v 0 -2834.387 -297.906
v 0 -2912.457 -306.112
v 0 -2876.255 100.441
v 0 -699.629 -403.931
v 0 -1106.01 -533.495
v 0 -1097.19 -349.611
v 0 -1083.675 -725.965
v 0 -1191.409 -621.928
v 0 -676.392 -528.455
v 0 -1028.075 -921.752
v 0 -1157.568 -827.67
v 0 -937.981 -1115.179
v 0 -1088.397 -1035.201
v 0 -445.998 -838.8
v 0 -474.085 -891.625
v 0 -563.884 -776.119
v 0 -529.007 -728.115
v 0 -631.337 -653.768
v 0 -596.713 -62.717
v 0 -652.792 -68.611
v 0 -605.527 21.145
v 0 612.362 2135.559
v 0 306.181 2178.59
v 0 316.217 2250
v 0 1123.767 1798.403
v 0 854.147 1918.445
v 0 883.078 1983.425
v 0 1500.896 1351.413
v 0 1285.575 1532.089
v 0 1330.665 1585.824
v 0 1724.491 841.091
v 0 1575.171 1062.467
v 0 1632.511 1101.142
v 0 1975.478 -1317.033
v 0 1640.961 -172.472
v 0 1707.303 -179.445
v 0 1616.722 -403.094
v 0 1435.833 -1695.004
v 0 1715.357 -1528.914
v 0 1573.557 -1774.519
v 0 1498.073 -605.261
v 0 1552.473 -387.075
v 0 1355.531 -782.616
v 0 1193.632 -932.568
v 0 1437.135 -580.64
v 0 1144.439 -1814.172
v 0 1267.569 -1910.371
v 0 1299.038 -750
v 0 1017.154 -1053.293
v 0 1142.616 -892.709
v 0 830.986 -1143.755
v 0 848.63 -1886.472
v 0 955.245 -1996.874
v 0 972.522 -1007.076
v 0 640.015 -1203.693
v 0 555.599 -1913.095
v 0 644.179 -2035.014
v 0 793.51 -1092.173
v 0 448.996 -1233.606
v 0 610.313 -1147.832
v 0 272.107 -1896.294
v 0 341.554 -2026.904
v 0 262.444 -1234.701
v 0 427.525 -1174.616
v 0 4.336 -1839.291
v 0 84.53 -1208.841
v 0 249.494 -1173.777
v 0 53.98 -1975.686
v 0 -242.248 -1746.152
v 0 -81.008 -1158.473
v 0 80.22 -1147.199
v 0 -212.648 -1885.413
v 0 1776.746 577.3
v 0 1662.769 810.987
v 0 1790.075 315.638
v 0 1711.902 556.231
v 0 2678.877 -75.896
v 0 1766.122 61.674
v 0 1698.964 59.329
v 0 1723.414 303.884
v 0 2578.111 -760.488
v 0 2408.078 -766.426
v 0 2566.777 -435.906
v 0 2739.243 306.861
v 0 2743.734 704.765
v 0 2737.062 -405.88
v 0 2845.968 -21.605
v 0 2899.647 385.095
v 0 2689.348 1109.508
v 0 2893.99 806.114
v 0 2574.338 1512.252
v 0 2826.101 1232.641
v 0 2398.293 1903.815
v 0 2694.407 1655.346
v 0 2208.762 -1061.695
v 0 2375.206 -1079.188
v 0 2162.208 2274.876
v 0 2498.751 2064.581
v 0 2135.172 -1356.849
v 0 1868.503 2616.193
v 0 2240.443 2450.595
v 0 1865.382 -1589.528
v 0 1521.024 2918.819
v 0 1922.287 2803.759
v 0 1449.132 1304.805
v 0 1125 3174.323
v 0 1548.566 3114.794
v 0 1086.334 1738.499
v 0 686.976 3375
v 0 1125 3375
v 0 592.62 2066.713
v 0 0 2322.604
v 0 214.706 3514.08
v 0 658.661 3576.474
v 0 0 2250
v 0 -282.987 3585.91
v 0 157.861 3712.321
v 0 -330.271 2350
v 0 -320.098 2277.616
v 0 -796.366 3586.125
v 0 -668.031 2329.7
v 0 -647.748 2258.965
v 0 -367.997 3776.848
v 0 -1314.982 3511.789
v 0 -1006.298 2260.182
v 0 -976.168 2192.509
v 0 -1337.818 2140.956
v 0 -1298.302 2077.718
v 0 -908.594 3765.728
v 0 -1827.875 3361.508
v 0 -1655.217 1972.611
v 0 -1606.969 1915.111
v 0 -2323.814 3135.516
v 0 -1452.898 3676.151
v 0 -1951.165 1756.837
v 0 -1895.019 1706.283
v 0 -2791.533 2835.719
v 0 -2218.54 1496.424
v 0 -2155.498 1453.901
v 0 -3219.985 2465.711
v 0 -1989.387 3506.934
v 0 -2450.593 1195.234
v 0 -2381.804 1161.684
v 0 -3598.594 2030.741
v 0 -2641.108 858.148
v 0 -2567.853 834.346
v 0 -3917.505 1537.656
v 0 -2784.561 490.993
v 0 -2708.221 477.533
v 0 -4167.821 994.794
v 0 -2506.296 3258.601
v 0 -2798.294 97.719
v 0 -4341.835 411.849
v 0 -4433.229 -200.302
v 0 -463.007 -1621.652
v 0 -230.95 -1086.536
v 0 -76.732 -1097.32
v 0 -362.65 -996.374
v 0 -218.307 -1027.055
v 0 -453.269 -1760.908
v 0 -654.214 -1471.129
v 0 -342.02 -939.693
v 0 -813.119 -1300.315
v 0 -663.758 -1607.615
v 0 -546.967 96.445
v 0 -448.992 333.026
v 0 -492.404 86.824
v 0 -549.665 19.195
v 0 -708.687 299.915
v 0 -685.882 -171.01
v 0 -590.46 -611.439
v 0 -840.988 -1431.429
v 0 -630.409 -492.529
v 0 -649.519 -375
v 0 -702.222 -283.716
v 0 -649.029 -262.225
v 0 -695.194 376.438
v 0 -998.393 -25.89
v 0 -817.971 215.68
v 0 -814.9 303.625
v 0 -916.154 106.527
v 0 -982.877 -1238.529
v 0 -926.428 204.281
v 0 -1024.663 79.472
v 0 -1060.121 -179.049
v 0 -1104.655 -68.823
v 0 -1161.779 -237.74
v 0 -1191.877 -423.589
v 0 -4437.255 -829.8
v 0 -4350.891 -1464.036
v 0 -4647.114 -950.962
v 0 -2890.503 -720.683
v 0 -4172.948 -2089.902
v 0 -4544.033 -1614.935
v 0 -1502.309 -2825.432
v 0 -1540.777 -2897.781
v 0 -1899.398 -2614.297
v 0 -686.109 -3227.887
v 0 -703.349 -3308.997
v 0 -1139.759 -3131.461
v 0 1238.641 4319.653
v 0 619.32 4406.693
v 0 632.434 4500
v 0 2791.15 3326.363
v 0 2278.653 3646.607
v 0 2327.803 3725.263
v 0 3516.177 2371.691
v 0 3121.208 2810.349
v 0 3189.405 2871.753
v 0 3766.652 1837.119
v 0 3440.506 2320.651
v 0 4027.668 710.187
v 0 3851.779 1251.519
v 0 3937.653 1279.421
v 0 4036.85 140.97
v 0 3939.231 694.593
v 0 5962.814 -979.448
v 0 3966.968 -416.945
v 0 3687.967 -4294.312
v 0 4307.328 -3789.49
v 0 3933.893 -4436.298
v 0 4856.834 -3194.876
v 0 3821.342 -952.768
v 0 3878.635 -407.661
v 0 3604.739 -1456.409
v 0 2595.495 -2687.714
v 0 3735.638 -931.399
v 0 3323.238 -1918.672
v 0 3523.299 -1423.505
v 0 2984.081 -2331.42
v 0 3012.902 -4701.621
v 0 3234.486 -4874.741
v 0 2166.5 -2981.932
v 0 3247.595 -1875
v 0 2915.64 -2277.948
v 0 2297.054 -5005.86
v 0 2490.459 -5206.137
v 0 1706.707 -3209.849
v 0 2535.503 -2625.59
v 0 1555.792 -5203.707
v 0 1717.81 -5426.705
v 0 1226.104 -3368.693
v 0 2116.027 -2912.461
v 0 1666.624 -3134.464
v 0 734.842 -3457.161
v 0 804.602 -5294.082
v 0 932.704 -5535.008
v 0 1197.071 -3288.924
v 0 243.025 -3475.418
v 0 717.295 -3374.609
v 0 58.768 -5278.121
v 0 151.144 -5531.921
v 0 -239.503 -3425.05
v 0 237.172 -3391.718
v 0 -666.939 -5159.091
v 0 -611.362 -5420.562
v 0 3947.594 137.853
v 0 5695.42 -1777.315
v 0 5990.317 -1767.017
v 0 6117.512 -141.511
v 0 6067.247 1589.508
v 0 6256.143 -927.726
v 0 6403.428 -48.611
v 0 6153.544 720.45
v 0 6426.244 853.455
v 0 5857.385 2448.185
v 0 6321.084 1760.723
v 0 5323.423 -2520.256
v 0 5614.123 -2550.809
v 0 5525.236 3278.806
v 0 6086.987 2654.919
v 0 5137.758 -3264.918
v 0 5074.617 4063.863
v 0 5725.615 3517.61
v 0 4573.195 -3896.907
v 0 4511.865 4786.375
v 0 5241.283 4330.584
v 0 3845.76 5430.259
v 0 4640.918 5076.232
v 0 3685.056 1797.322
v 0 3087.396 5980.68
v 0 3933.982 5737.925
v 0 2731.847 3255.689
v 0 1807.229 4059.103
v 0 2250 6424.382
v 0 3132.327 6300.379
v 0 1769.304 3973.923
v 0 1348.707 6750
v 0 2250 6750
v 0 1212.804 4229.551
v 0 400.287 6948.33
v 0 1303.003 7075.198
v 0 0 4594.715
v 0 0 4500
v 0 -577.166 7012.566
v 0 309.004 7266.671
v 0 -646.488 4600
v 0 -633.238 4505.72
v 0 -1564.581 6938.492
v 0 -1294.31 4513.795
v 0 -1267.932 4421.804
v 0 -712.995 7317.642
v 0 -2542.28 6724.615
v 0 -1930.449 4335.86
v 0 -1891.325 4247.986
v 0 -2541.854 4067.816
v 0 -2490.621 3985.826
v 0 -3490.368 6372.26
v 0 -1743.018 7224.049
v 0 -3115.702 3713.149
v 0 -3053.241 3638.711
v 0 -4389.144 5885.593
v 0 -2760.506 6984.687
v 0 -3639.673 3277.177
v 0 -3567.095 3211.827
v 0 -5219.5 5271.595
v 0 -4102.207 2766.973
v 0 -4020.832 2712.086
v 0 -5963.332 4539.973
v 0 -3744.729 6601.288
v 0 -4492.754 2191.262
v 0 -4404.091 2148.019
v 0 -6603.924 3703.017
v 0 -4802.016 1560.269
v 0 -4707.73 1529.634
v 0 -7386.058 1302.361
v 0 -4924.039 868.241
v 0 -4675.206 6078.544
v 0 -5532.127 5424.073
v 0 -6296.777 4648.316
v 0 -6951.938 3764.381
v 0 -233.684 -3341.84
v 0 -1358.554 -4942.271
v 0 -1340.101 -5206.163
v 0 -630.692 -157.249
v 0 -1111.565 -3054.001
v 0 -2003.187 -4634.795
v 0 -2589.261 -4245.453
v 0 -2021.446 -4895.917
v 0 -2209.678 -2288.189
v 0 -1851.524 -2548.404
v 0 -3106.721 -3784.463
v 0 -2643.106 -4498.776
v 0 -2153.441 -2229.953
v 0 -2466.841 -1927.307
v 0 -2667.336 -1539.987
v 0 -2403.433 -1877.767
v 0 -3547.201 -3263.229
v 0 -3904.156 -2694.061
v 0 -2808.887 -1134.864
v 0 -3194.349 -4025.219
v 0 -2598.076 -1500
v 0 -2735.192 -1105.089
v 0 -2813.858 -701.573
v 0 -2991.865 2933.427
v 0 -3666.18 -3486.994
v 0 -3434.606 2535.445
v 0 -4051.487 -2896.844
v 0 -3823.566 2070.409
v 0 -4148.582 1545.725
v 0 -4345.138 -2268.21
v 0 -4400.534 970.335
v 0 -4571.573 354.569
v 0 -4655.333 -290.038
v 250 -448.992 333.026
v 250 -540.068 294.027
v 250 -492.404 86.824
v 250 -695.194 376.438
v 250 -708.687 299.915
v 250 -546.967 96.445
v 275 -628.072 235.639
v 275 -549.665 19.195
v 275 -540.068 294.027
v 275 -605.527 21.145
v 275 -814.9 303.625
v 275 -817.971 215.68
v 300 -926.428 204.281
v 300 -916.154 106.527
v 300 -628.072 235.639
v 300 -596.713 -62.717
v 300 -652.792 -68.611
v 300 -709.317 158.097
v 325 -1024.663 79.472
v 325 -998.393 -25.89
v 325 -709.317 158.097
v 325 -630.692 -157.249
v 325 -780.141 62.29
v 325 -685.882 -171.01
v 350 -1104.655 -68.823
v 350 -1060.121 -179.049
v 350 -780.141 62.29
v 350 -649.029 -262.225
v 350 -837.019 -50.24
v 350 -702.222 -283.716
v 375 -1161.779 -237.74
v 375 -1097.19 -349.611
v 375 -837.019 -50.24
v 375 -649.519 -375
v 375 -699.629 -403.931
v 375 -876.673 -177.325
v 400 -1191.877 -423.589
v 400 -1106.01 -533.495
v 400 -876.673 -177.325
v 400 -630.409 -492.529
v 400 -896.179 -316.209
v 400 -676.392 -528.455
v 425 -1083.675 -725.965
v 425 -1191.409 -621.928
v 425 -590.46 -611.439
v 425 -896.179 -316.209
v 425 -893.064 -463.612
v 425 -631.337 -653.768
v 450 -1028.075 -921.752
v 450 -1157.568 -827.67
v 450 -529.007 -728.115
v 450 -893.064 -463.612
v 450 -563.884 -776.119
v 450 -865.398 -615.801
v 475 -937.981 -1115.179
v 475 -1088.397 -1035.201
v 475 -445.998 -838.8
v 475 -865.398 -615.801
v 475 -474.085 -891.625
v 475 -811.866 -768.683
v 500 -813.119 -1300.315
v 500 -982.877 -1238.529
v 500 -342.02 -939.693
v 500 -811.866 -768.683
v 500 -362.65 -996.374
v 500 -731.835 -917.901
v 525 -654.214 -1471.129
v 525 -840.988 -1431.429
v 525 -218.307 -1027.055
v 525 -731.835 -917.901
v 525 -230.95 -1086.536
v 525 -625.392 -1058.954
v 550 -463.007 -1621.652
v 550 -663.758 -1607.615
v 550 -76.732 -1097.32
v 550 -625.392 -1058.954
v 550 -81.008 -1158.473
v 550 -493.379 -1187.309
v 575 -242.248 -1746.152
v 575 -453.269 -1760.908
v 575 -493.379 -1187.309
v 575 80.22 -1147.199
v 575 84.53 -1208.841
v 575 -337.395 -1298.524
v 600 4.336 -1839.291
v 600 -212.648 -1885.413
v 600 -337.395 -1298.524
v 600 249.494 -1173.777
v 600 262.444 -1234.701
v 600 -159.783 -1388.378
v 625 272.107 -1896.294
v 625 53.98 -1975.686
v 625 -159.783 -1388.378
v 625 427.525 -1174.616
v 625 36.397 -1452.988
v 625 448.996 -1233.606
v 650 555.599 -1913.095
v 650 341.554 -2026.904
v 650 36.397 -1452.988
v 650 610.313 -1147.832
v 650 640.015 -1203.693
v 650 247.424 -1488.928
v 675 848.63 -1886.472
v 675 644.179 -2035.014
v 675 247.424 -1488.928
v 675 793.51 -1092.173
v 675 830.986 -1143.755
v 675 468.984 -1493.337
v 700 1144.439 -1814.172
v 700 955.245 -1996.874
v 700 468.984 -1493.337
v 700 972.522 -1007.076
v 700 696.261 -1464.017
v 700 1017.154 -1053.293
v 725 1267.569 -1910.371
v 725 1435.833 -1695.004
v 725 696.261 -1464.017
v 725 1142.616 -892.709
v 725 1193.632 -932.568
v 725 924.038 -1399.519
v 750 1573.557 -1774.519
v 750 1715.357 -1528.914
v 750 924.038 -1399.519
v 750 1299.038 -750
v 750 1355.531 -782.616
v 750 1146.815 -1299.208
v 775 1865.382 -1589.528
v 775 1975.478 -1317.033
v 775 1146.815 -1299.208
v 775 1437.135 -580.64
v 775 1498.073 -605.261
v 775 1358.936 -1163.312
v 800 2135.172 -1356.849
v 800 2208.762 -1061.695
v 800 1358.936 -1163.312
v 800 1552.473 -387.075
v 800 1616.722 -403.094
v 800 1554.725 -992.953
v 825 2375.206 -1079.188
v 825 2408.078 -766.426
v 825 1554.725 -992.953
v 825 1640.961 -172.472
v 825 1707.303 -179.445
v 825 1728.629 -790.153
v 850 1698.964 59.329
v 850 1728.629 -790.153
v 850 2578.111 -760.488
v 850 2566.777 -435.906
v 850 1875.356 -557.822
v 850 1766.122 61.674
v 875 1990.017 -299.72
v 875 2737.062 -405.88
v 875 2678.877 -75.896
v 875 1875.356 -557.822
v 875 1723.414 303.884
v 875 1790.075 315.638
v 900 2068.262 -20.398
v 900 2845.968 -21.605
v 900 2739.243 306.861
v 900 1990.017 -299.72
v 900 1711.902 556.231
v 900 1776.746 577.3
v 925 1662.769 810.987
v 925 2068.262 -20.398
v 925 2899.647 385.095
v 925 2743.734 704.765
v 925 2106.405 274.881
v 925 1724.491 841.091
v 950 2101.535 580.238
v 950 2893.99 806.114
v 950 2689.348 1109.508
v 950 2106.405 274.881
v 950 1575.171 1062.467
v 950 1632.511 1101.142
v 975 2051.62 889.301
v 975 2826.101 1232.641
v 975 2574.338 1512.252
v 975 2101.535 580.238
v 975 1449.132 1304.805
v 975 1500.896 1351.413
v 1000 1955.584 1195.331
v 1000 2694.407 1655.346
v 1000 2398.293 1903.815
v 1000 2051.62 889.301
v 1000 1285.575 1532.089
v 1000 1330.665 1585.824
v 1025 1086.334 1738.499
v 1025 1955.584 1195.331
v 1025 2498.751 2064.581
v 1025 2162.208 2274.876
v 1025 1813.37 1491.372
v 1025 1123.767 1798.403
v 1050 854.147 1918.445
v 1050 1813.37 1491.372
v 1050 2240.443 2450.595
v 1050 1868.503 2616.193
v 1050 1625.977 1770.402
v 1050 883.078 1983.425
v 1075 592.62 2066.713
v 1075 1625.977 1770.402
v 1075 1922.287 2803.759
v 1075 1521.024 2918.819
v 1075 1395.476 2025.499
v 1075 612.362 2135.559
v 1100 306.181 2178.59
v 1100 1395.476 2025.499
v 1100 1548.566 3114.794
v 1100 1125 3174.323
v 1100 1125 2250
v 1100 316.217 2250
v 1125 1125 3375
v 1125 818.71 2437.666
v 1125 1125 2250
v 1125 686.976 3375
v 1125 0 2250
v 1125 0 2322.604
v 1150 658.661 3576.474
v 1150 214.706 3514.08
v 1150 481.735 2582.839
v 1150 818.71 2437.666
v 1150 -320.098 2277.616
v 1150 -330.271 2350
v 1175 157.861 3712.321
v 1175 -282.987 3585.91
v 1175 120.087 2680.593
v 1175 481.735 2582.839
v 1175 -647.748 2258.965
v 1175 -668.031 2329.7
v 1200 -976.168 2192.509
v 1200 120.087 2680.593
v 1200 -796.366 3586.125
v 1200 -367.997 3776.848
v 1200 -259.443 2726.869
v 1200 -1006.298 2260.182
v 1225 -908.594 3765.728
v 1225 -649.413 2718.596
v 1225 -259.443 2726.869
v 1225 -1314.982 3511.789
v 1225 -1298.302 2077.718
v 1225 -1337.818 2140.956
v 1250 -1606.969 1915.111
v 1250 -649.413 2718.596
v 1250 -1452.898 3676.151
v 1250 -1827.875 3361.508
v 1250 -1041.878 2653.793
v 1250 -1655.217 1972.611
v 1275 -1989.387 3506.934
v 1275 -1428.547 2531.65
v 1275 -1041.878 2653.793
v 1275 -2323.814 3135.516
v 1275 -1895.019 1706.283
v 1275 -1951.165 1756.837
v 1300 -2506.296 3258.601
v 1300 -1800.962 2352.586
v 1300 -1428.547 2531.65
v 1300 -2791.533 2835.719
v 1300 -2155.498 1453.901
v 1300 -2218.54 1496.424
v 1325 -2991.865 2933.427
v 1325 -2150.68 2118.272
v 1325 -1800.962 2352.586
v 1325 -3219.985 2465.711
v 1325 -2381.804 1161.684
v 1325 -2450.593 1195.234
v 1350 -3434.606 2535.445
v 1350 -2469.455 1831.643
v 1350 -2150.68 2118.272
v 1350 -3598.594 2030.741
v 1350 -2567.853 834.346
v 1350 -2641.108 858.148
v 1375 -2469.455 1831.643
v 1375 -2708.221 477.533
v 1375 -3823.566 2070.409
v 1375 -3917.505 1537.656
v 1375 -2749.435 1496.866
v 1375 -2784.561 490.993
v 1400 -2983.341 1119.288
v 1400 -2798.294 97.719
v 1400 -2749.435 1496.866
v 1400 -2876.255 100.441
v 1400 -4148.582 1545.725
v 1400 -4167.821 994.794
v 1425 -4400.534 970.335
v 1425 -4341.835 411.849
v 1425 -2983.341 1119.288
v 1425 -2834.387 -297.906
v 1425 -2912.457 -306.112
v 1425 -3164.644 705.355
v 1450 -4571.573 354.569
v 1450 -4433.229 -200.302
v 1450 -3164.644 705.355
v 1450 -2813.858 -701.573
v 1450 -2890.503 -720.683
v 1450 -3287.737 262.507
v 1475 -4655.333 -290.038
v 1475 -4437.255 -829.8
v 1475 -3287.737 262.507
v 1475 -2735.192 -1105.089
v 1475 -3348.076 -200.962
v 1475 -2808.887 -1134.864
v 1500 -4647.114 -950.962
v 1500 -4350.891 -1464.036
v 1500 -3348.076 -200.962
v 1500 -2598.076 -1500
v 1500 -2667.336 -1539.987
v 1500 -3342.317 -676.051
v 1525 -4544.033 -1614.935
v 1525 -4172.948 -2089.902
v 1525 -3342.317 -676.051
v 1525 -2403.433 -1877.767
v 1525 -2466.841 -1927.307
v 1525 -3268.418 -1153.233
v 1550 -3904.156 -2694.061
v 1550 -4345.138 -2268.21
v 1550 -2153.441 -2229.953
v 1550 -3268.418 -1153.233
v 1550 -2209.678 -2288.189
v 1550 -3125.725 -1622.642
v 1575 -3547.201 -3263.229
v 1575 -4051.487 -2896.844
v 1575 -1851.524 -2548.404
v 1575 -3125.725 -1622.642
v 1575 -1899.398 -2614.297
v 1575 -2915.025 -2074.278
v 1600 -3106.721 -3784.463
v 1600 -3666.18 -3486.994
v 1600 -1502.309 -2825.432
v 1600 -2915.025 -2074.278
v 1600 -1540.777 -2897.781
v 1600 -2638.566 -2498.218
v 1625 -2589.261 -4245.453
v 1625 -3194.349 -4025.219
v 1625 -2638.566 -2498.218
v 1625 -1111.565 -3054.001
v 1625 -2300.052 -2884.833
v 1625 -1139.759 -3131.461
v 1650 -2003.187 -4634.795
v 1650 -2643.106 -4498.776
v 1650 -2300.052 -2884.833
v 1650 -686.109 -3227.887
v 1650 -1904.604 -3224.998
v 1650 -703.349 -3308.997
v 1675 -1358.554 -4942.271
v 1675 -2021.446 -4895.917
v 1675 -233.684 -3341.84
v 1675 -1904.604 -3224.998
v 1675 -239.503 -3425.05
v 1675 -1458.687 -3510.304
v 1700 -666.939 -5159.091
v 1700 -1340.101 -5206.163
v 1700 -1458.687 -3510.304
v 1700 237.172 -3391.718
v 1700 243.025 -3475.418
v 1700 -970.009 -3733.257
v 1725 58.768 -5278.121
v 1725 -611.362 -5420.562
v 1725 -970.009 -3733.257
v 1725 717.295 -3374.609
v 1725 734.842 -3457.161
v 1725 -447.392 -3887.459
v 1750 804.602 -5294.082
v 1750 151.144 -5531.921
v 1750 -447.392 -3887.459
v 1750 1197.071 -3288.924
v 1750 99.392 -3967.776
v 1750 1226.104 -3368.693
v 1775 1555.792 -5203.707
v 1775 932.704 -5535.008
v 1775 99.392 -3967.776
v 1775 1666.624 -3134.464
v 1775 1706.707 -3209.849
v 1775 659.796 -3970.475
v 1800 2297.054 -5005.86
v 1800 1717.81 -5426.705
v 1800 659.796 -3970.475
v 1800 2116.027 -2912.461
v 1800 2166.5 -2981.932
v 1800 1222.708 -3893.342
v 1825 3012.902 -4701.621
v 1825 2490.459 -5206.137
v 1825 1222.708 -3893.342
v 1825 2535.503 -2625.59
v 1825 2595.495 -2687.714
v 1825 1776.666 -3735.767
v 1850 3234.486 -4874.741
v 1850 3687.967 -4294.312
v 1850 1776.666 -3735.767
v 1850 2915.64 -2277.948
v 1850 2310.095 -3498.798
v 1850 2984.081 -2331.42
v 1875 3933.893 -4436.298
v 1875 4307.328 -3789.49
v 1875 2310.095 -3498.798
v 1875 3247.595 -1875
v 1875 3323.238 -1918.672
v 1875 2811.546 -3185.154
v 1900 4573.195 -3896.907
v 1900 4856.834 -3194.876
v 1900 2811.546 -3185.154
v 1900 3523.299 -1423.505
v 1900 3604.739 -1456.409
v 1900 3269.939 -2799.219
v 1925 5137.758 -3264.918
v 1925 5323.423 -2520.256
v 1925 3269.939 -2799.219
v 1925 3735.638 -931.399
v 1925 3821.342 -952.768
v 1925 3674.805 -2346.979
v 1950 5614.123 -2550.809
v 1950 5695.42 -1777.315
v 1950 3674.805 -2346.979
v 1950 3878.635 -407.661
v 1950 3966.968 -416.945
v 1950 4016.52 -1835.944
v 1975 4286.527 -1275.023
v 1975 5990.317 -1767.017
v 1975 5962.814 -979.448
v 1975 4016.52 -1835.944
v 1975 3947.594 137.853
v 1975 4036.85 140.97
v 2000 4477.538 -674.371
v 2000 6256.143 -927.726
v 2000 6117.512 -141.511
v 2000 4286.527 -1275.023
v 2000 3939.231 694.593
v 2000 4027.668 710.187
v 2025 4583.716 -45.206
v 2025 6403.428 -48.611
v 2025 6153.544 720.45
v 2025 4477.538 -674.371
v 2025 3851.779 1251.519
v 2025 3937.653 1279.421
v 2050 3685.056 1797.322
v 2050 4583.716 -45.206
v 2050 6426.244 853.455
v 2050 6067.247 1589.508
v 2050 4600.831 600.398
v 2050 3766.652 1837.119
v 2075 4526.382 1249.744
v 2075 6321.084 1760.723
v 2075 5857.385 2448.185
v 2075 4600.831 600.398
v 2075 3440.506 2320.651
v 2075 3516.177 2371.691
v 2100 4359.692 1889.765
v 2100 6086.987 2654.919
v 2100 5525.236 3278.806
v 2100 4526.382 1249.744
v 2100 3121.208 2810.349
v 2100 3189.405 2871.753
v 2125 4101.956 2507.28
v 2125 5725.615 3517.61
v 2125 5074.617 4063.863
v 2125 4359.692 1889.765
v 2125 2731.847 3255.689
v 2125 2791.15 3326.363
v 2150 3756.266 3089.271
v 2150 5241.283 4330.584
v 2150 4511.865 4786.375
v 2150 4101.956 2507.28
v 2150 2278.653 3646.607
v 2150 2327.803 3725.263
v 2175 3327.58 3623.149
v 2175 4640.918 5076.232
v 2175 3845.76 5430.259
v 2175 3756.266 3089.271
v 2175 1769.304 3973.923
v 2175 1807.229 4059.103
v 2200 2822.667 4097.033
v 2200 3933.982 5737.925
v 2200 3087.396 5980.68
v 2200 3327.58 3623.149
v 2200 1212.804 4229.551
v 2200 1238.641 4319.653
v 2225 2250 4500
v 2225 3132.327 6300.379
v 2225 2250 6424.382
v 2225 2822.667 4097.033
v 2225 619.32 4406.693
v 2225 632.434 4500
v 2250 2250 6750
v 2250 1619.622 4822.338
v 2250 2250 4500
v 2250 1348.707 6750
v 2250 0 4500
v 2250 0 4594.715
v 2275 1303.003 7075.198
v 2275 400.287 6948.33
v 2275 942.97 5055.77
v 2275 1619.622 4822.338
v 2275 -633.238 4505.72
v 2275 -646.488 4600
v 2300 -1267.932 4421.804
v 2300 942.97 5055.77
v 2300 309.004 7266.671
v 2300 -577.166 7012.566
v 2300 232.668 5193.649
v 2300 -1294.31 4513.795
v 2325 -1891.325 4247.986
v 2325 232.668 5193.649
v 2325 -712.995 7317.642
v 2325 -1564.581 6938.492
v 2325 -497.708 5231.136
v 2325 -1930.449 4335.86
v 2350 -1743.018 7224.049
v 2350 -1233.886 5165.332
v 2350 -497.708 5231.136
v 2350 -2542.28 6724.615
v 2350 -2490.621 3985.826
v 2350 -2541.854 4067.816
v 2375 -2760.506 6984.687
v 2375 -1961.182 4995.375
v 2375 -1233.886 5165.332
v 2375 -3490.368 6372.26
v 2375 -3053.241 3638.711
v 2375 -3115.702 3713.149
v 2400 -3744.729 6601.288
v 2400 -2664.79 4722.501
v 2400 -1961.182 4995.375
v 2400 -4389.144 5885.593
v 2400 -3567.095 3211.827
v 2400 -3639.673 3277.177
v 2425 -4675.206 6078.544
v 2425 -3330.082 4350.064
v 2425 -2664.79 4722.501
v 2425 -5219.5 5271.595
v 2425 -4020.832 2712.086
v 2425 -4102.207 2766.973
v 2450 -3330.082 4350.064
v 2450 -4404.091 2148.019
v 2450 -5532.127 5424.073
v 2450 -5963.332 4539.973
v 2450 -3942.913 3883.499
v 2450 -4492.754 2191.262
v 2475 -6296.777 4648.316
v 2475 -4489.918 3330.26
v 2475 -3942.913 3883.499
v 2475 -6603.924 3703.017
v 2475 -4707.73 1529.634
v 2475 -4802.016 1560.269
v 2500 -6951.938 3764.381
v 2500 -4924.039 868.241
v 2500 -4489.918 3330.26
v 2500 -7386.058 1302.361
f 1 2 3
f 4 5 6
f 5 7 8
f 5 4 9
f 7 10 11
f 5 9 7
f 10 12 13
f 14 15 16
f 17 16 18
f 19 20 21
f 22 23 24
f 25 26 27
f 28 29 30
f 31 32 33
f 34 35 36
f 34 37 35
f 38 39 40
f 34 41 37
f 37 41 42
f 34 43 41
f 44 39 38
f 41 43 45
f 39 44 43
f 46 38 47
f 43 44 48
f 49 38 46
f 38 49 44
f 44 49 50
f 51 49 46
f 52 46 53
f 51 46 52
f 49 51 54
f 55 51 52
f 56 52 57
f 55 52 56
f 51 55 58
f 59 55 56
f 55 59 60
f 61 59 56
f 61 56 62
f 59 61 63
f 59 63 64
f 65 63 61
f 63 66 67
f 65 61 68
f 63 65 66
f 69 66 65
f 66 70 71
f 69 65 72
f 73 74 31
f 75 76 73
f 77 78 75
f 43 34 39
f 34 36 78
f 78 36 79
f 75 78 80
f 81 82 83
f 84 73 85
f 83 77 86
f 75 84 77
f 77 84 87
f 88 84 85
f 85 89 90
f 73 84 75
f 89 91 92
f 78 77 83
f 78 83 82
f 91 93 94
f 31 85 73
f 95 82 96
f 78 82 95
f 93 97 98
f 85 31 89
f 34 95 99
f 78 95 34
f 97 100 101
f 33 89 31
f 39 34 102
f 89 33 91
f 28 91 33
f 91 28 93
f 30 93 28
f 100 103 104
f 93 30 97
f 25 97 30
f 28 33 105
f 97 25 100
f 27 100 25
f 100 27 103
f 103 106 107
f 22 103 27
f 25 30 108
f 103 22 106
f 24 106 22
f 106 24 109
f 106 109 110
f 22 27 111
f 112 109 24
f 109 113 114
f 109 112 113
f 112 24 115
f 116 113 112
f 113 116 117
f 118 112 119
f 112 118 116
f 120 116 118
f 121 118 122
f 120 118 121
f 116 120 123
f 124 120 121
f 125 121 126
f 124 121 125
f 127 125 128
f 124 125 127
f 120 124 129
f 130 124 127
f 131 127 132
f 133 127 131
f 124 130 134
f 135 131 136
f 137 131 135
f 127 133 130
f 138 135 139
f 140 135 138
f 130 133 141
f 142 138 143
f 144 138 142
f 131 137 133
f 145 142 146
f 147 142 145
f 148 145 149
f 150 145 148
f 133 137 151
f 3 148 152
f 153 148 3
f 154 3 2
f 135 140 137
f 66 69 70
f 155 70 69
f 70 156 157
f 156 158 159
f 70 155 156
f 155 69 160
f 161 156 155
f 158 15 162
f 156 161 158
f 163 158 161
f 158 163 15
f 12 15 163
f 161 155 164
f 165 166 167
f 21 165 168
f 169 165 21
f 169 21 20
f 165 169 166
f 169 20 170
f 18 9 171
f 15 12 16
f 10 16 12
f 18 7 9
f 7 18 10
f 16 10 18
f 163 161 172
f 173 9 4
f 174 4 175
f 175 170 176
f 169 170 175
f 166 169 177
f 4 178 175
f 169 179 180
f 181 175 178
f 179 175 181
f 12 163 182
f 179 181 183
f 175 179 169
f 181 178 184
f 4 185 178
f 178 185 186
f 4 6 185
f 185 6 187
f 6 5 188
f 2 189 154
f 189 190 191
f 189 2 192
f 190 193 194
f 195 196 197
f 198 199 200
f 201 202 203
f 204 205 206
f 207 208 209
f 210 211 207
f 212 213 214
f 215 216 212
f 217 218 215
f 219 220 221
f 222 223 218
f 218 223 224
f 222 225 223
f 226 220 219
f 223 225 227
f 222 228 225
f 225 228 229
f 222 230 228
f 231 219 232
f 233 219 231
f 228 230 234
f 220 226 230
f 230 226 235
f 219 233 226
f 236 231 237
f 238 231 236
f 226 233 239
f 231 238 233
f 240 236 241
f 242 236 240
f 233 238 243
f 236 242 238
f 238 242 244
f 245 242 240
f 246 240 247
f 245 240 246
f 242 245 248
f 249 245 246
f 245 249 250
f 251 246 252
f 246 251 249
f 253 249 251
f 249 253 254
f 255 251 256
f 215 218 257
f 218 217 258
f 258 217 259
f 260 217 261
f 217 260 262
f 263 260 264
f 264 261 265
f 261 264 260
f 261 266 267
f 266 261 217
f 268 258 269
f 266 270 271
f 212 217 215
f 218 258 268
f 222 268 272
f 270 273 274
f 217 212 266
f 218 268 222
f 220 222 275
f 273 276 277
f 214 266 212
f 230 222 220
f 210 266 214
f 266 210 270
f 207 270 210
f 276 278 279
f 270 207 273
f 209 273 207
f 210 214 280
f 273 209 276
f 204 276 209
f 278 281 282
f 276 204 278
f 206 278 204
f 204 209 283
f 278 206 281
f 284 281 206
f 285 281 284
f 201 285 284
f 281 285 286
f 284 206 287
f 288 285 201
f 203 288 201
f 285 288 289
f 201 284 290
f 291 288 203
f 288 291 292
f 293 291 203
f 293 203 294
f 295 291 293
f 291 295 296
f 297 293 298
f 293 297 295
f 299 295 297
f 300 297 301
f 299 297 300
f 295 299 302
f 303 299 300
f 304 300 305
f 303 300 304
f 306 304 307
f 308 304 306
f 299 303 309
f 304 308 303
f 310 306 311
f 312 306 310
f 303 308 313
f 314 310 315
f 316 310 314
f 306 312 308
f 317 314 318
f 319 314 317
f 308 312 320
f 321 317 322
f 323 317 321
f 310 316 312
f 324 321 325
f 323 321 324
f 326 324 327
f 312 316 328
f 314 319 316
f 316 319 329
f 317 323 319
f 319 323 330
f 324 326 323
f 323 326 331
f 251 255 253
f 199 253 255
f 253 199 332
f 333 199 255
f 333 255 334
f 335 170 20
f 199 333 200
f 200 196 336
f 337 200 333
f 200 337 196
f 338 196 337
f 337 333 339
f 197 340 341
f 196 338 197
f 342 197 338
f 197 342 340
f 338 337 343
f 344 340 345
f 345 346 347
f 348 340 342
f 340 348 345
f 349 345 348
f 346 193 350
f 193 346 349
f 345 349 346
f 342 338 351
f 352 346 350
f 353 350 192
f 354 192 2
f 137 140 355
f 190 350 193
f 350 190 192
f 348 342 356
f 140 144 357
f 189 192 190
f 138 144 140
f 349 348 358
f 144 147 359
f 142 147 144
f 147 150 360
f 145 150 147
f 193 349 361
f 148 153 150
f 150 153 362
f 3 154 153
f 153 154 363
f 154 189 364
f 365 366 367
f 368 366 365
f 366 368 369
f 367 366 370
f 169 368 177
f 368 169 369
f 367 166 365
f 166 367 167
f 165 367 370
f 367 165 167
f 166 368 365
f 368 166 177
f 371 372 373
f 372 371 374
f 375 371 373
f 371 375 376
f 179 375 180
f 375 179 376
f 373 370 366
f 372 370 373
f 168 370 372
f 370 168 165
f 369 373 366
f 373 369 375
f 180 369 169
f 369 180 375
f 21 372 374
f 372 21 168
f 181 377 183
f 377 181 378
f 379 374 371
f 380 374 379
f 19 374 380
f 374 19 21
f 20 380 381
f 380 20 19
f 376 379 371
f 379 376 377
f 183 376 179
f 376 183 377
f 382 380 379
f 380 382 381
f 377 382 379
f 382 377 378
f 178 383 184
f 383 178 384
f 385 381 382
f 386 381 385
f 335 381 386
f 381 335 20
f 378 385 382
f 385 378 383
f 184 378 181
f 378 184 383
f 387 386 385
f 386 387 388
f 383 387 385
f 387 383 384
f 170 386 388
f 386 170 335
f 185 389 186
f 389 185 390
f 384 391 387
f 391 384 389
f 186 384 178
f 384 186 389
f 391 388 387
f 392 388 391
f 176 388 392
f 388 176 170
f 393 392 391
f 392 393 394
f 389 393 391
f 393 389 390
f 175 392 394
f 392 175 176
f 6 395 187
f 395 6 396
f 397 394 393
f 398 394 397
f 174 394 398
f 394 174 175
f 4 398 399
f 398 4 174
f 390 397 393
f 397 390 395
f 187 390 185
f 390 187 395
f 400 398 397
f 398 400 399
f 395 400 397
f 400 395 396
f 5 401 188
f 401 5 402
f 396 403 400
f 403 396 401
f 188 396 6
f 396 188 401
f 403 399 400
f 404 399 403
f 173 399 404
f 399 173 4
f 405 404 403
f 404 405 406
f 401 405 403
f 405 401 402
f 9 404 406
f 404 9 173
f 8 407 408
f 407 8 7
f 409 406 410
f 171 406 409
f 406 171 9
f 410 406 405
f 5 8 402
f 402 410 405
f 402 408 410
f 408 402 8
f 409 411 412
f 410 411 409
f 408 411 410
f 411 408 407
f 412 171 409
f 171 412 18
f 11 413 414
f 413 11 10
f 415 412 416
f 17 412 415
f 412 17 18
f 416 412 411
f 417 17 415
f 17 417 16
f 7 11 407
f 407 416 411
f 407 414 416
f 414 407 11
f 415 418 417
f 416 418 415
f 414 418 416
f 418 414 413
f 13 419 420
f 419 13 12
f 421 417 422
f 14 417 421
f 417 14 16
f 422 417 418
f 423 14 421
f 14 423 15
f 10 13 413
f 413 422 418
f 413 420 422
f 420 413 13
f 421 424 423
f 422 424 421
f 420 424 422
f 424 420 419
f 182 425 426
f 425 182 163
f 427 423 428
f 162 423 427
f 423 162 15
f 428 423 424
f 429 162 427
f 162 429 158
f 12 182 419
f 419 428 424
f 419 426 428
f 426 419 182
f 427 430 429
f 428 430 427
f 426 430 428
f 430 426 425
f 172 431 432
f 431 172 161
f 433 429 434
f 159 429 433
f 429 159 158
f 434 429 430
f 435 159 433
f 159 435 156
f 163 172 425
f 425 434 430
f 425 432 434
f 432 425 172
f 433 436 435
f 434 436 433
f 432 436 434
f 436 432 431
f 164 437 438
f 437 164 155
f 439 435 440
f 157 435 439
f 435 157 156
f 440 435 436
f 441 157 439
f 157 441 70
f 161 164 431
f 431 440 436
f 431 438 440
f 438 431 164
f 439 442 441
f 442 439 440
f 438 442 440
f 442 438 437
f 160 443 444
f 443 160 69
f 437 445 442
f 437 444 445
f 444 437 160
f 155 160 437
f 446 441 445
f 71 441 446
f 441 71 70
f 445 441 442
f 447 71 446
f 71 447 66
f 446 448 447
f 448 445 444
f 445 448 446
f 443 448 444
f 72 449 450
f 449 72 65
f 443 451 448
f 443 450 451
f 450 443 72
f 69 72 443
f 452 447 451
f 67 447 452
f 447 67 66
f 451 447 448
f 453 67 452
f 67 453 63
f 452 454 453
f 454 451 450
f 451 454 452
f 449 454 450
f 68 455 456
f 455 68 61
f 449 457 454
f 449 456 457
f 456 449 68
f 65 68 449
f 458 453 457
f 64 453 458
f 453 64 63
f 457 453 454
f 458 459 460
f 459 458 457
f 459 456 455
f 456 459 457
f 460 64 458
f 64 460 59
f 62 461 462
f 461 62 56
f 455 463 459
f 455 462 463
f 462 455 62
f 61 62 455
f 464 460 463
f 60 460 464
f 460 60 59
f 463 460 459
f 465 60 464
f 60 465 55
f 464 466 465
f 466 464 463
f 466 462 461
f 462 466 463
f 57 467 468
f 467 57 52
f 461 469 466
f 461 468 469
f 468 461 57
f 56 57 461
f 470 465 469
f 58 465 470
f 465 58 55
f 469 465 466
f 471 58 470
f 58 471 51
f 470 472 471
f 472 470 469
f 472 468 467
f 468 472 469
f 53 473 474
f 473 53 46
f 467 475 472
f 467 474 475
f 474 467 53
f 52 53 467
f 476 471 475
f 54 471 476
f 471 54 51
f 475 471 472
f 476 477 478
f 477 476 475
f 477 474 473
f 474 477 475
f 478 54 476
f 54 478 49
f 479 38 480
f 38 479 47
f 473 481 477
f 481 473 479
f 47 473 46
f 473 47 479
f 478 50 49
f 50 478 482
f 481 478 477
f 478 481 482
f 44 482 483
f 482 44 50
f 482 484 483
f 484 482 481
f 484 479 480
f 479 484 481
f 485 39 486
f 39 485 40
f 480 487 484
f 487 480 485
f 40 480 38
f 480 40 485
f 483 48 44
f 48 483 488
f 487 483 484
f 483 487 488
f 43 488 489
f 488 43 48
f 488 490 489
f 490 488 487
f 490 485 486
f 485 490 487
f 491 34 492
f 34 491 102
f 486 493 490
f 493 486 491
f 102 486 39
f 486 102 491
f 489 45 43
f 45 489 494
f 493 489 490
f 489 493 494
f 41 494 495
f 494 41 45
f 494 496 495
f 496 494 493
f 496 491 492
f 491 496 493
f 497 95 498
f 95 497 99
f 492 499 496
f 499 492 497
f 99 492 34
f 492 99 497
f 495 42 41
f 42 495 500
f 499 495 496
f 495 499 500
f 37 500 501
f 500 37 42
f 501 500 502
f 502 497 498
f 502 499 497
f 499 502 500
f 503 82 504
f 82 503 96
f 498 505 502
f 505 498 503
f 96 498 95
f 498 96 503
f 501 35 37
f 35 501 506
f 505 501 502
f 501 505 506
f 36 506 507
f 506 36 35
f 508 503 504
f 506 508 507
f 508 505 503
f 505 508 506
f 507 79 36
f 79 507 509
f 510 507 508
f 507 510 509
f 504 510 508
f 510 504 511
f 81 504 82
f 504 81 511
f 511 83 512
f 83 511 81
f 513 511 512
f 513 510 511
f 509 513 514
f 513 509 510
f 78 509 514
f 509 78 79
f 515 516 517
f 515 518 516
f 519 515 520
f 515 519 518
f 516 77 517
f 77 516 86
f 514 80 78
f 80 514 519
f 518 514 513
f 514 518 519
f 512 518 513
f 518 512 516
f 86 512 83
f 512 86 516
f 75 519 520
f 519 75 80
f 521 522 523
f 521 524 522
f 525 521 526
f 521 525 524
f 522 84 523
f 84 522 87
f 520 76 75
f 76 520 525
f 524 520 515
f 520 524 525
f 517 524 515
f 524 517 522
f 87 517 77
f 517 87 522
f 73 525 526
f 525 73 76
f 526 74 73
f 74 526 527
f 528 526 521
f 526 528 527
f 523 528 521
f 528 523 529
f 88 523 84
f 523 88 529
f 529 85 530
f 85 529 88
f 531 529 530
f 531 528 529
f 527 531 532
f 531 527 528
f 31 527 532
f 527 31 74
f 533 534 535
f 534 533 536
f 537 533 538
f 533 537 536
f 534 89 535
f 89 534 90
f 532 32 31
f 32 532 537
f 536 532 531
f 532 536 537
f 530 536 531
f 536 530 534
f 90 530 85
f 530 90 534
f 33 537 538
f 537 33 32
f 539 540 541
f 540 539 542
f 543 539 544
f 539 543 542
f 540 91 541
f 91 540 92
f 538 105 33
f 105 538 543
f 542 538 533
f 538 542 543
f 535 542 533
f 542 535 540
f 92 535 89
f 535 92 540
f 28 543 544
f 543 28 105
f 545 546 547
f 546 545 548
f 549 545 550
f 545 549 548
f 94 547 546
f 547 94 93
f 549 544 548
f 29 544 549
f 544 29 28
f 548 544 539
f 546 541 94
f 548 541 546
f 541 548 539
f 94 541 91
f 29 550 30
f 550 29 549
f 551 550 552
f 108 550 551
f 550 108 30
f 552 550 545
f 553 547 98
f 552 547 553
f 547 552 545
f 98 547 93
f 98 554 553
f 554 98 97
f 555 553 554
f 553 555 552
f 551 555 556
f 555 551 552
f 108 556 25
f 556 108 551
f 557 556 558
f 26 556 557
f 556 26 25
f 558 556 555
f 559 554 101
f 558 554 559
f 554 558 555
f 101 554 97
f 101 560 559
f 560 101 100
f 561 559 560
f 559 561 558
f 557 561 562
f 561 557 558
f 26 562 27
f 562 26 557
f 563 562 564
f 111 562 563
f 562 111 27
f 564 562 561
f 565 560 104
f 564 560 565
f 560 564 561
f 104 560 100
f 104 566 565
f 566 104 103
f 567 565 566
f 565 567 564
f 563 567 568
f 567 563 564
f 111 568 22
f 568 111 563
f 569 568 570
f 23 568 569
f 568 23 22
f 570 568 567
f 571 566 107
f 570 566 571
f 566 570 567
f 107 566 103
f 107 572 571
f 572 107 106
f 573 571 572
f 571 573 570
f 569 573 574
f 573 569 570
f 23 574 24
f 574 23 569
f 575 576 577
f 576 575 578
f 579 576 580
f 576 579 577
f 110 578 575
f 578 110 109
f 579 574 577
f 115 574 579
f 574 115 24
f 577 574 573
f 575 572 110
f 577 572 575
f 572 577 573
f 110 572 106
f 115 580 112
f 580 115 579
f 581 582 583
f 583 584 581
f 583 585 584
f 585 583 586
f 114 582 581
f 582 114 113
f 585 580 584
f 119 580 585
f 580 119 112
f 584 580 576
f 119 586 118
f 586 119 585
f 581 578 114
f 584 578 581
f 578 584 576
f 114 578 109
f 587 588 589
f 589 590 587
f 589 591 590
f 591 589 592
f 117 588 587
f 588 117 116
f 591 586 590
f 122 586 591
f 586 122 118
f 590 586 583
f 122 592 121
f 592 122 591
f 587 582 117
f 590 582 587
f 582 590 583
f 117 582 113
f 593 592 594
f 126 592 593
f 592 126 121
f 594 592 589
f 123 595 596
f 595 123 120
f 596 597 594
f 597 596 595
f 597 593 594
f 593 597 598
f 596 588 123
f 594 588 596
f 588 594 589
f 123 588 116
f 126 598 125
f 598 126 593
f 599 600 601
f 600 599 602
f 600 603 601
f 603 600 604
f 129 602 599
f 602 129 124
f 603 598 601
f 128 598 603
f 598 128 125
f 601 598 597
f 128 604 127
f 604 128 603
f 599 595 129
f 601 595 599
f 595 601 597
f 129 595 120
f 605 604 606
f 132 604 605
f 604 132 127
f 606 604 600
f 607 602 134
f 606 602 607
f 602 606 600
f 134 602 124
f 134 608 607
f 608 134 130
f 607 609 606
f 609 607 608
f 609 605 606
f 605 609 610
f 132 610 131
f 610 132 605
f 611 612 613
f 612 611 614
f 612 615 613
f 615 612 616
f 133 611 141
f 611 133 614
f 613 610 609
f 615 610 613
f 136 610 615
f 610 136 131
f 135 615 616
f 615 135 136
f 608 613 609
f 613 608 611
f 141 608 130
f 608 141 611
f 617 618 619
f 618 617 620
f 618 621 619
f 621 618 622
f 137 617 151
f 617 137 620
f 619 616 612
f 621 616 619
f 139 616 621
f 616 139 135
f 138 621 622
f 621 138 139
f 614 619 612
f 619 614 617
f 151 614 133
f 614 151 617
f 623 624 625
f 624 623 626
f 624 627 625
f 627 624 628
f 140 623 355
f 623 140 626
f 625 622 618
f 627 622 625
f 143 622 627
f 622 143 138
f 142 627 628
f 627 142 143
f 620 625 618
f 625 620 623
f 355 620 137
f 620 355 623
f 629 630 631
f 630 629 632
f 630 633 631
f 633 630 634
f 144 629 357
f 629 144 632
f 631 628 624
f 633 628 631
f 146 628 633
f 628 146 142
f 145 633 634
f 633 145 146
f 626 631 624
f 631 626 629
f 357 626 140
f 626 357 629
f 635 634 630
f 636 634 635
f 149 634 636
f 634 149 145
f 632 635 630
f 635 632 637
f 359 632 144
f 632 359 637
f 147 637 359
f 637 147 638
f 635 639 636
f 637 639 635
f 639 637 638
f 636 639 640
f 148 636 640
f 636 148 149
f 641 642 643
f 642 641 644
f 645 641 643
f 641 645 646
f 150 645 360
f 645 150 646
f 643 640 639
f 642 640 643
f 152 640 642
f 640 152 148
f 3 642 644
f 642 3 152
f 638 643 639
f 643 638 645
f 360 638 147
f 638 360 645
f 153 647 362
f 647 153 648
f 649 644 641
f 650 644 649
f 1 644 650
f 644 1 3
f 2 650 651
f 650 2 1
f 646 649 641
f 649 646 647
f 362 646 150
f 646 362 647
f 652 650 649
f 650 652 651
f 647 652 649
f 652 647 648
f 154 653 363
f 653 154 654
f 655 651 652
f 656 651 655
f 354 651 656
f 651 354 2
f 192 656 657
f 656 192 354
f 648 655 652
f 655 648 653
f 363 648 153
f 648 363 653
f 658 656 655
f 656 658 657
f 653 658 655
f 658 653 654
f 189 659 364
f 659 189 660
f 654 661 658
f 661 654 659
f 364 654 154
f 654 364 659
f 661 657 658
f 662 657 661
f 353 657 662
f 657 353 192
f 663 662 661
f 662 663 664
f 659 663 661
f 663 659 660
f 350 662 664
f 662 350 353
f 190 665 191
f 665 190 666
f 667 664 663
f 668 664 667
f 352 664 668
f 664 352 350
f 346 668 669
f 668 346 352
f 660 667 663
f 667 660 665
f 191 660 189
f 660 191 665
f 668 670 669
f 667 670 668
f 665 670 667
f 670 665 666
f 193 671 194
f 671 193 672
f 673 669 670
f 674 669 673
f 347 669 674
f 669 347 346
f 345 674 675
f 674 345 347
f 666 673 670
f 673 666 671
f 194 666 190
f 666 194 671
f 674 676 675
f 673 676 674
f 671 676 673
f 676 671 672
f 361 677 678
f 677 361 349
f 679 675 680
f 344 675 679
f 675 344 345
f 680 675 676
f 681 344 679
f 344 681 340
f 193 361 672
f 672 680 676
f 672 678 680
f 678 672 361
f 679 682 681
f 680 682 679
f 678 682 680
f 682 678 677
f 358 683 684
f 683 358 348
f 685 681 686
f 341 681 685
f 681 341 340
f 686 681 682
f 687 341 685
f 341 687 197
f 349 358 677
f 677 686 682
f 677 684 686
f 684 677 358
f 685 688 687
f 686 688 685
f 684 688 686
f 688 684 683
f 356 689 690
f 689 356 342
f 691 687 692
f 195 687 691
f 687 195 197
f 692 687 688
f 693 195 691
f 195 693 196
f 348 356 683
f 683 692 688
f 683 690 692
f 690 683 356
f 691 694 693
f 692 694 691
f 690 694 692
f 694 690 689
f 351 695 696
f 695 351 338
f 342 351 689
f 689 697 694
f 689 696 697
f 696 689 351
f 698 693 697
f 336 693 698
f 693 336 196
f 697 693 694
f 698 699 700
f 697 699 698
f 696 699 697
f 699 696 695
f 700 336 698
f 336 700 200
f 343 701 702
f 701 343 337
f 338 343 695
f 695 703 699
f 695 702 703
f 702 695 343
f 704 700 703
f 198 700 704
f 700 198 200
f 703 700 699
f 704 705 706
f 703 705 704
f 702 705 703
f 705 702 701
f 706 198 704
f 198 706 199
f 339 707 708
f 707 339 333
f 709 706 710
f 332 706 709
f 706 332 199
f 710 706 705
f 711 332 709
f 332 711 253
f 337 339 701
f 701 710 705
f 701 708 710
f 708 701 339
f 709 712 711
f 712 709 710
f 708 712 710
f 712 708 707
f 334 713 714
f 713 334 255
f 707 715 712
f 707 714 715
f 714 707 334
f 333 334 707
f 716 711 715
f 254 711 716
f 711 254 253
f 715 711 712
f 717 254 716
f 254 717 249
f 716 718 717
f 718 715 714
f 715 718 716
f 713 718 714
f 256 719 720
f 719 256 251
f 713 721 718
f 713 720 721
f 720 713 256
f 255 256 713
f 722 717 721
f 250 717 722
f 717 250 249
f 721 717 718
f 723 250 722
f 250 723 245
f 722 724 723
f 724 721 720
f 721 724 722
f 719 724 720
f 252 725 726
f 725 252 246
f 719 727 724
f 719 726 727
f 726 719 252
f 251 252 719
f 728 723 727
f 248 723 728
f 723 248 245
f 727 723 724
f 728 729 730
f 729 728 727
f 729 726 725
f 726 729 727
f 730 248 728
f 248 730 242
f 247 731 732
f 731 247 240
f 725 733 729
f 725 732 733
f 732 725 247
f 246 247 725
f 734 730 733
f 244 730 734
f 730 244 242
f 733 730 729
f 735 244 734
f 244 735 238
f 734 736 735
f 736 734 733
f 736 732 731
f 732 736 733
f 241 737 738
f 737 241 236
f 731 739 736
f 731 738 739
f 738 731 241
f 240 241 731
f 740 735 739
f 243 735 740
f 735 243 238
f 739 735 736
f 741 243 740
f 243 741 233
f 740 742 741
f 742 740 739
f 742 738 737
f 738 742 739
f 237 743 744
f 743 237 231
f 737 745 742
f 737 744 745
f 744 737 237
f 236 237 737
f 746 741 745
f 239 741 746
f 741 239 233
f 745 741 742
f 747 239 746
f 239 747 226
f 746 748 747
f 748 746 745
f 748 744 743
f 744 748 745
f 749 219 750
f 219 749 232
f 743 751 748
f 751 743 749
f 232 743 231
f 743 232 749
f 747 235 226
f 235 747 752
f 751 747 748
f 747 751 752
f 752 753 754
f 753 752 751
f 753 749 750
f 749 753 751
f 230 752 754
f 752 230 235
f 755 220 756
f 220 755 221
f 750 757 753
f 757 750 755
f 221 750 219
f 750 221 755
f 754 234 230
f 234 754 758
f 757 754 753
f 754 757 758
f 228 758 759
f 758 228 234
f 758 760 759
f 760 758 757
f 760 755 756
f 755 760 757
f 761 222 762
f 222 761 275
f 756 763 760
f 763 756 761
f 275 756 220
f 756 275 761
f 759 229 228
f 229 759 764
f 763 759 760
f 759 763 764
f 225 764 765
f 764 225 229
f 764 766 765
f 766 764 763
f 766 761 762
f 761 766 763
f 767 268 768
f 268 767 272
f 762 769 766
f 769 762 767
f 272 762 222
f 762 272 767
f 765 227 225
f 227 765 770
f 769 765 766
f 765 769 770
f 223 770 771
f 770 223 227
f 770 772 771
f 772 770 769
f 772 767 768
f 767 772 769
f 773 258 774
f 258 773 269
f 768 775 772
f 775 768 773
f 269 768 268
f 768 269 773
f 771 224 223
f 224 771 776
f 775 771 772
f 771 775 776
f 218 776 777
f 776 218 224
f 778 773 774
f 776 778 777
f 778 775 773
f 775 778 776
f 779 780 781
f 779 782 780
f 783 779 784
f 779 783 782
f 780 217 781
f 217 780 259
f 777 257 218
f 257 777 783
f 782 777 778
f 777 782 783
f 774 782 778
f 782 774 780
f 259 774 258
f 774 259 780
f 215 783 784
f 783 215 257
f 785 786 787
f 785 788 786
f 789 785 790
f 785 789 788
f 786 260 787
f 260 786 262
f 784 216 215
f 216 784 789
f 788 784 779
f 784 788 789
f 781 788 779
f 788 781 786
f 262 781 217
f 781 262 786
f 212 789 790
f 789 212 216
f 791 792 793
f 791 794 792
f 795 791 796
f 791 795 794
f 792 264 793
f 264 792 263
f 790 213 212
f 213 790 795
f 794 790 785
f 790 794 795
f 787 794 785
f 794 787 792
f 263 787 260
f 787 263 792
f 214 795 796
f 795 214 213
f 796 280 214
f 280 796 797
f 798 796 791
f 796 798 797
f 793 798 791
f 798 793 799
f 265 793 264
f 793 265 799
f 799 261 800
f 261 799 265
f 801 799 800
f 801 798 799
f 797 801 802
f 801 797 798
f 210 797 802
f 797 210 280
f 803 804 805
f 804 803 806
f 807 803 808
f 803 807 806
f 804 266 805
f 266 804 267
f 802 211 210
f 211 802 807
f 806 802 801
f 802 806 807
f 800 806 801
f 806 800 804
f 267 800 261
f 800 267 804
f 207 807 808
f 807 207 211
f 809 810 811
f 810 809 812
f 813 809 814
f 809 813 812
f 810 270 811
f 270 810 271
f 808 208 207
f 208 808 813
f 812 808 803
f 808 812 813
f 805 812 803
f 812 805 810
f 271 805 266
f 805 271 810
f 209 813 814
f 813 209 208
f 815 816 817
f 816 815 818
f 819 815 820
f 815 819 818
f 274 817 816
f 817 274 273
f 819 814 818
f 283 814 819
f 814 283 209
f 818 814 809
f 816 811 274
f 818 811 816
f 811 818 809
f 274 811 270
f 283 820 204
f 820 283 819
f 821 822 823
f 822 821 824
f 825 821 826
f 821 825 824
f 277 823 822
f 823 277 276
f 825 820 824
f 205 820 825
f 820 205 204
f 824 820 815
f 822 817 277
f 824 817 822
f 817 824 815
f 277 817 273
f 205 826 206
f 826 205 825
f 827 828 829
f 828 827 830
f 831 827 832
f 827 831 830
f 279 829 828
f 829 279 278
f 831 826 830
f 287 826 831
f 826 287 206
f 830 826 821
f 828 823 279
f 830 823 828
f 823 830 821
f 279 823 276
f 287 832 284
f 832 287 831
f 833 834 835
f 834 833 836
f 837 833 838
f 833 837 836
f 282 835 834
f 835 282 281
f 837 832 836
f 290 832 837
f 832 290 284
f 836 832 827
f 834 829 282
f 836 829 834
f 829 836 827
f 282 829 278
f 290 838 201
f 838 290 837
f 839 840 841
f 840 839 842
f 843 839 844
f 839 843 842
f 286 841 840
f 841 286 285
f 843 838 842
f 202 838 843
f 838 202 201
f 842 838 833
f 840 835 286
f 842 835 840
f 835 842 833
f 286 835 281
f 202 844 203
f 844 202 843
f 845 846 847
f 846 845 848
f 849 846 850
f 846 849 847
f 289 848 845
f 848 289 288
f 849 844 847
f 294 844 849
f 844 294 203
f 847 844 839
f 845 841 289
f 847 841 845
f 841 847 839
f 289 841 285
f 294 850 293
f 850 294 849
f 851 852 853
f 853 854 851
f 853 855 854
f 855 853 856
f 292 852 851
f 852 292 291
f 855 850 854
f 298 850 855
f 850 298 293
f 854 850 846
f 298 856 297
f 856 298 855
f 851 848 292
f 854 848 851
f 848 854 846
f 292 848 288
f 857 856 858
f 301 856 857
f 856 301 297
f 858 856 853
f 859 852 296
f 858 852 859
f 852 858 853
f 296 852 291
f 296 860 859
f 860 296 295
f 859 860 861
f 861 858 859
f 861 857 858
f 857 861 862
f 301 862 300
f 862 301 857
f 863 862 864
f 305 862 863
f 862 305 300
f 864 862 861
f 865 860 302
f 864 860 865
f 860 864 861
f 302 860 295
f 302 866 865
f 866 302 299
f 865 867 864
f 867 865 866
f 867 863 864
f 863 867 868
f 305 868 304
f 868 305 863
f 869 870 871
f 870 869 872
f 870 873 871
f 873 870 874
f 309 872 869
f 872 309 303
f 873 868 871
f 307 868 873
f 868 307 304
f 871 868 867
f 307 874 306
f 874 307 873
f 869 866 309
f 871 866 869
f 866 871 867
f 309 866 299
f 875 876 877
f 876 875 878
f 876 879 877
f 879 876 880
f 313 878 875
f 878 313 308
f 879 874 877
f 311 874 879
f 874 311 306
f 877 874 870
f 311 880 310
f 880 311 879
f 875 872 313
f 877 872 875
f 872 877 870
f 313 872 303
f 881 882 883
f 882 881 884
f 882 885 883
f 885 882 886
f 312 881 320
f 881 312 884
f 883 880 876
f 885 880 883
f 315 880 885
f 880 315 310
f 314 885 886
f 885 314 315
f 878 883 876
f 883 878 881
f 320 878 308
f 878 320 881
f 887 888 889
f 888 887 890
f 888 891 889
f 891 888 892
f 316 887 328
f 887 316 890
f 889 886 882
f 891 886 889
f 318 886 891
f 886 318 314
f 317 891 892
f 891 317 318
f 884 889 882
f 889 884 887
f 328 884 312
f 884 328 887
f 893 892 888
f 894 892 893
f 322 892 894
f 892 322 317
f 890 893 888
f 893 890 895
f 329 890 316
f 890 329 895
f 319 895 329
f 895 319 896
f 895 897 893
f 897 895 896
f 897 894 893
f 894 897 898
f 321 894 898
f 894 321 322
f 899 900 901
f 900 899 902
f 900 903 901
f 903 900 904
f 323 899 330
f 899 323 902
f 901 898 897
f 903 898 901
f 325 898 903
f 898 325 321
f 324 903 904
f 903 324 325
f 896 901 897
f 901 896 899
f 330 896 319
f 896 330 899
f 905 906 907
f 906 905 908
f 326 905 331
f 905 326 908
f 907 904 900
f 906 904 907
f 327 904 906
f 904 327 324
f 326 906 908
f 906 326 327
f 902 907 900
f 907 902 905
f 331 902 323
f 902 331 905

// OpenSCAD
 // SQUARE SPIRAL
 
 for (i = [10:100])
   {
       angle = i*360/45;
       distance = i*10;
       r = i*25;
       {
       rotate(angle, [i,0,0])
       translate([0, 0, 5*distance])
       cube(r);         

//        translate([0.1*distance, 0.1*distance, 0.1*distance])
//        rotate(angle, [0, 0.1*i, 0])
//        cube(10,10,10);
        
//        rotate(angle, [1, -i, 1])
//        translate([0, distance, 0])
//        sphere(r);
           

    }
}
